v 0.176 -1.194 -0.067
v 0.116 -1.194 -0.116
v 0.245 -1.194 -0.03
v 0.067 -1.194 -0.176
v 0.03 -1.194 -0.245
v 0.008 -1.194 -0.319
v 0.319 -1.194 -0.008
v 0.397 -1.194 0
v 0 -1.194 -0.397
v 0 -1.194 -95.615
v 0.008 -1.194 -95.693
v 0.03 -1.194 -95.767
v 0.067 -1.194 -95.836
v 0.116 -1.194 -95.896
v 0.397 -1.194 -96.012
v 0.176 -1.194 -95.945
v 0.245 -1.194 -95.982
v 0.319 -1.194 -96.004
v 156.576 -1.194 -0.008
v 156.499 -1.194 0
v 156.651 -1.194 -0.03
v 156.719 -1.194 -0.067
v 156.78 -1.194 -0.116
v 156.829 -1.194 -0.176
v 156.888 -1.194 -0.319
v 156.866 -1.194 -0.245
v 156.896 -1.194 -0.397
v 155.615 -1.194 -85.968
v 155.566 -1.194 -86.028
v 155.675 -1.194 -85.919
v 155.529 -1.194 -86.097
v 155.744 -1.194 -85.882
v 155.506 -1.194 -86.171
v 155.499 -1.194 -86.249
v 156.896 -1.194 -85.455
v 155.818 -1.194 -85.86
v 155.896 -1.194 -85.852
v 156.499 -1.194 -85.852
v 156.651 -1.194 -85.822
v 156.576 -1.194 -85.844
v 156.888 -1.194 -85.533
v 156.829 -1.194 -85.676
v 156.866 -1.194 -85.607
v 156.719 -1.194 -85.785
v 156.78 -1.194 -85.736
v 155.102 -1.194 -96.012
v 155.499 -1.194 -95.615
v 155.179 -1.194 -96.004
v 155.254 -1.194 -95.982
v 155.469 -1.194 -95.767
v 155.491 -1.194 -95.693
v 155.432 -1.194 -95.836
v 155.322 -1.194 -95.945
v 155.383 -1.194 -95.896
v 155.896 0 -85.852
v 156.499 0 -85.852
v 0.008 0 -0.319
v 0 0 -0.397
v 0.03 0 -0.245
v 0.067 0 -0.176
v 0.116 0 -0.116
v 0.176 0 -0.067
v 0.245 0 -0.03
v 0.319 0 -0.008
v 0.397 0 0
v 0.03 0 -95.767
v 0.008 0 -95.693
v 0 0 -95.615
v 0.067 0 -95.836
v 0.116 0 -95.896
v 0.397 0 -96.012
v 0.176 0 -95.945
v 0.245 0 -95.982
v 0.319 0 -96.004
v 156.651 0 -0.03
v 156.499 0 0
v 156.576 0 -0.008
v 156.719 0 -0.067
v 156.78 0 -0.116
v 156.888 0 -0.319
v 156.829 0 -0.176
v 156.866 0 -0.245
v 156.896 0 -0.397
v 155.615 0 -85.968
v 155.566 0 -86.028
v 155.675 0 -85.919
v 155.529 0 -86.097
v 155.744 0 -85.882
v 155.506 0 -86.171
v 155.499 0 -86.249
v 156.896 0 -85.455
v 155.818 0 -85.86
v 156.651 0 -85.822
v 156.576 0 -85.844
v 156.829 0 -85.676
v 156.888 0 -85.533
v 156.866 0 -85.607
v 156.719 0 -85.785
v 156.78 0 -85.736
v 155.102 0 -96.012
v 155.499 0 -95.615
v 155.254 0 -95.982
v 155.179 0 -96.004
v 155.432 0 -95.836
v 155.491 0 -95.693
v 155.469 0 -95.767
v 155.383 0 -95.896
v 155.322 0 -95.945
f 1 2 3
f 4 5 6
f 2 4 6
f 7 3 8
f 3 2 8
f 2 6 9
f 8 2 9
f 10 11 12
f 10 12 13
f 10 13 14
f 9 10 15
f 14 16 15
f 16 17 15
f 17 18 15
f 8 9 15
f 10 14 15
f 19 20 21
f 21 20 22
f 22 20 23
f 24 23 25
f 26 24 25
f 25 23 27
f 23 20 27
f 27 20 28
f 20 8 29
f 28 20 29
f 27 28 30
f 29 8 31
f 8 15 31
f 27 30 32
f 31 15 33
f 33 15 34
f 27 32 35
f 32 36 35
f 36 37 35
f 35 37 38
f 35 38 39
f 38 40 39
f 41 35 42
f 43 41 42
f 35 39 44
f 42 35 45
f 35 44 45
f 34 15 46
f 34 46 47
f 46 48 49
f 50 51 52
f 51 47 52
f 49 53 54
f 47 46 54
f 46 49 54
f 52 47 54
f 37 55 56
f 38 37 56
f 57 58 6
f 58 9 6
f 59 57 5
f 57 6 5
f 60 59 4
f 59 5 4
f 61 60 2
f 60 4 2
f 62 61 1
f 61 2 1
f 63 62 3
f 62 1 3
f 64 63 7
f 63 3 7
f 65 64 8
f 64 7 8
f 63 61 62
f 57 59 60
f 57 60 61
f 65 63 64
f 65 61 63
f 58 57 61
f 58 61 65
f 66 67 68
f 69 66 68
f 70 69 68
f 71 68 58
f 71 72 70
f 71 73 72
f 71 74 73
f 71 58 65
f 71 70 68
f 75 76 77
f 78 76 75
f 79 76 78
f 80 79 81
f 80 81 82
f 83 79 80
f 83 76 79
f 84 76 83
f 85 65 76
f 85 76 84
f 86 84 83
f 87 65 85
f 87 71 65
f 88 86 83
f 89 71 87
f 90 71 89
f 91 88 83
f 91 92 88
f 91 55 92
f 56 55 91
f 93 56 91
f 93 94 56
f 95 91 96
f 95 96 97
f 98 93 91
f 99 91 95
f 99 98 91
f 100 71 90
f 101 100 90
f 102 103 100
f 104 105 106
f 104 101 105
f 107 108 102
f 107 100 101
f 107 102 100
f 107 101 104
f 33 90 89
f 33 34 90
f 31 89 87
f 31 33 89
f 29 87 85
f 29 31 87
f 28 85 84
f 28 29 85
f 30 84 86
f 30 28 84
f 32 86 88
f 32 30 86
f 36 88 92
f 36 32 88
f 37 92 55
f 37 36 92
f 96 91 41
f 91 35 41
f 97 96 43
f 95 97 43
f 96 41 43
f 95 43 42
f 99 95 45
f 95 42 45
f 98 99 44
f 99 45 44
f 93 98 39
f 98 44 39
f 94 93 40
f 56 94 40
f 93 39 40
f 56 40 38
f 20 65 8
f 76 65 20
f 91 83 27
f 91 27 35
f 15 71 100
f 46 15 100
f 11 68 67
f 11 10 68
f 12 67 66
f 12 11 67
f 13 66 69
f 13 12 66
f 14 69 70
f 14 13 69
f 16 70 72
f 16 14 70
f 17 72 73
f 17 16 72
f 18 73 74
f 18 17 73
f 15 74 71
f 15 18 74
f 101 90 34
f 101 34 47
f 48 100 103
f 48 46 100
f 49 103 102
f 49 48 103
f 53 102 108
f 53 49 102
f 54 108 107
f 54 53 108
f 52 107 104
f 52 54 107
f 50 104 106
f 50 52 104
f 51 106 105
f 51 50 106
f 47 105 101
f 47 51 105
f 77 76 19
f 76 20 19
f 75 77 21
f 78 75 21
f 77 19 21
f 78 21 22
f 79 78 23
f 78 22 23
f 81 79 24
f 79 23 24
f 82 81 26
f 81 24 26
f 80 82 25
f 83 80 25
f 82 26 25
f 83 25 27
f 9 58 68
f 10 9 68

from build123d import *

# Parameters (mm, degrees)
SKETCH1_W          = 156.8958
SKETCH1_H          = 96.012
BASE_FLANGE1_DEPTH = 1.1938
SKETCH6_W          = 1.397
SKETCH6_H          = 10.16
CUT_EXTRUDE1_DEPTH = 184.945702206
FILLET1_R          = 0.396875


# Sheet-metal steps are written as plain solids
with BuildPart() as part:
    # Sketch1 → Base-Flange1 (new body)
    with BuildSketch(Plane(origin=(0, 0, 0), x_dir=(1, 0, 0), z_dir=(0, 1, 0))):
        with Locations((78.4479, 48.006)):
            Rectangle(SKETCH1_W, SKETCH1_H)
    extrude(amount=-BASE_FLANGE1_DEPTH)

    # Sketch6 → Cut-Extrude1 (cut, through all)
    with BuildSketch(Plane(origin=(0, 0, 0), x_dir=(1, 0, 0), z_dir=(0, 1, 0))):
        with Locations((156.1973, 90.932)):
            Rectangle(SKETCH6_W, SKETCH6_H)
    extrude(amount=-CUT_EXTRUDE1_DEPTH, mode=Mode.SUBTRACT)

    # Fillet1
    fillet1_edges = [part.edges().sort_by_distance(p)[0] for p in [
        (156.8958, -0.5969, -85.852),
        (155.4988, -0.5969, -85.852),
        (155.4988, -0.5969, -96.012),
        (0, -0.5969, 0),
        (0, -0.5969, -96.012),
        (156.8958, -0.5969, 0),
    ]]
    fillet(fillet1_edges, radius=FILLET1_R)


solid = part.part
